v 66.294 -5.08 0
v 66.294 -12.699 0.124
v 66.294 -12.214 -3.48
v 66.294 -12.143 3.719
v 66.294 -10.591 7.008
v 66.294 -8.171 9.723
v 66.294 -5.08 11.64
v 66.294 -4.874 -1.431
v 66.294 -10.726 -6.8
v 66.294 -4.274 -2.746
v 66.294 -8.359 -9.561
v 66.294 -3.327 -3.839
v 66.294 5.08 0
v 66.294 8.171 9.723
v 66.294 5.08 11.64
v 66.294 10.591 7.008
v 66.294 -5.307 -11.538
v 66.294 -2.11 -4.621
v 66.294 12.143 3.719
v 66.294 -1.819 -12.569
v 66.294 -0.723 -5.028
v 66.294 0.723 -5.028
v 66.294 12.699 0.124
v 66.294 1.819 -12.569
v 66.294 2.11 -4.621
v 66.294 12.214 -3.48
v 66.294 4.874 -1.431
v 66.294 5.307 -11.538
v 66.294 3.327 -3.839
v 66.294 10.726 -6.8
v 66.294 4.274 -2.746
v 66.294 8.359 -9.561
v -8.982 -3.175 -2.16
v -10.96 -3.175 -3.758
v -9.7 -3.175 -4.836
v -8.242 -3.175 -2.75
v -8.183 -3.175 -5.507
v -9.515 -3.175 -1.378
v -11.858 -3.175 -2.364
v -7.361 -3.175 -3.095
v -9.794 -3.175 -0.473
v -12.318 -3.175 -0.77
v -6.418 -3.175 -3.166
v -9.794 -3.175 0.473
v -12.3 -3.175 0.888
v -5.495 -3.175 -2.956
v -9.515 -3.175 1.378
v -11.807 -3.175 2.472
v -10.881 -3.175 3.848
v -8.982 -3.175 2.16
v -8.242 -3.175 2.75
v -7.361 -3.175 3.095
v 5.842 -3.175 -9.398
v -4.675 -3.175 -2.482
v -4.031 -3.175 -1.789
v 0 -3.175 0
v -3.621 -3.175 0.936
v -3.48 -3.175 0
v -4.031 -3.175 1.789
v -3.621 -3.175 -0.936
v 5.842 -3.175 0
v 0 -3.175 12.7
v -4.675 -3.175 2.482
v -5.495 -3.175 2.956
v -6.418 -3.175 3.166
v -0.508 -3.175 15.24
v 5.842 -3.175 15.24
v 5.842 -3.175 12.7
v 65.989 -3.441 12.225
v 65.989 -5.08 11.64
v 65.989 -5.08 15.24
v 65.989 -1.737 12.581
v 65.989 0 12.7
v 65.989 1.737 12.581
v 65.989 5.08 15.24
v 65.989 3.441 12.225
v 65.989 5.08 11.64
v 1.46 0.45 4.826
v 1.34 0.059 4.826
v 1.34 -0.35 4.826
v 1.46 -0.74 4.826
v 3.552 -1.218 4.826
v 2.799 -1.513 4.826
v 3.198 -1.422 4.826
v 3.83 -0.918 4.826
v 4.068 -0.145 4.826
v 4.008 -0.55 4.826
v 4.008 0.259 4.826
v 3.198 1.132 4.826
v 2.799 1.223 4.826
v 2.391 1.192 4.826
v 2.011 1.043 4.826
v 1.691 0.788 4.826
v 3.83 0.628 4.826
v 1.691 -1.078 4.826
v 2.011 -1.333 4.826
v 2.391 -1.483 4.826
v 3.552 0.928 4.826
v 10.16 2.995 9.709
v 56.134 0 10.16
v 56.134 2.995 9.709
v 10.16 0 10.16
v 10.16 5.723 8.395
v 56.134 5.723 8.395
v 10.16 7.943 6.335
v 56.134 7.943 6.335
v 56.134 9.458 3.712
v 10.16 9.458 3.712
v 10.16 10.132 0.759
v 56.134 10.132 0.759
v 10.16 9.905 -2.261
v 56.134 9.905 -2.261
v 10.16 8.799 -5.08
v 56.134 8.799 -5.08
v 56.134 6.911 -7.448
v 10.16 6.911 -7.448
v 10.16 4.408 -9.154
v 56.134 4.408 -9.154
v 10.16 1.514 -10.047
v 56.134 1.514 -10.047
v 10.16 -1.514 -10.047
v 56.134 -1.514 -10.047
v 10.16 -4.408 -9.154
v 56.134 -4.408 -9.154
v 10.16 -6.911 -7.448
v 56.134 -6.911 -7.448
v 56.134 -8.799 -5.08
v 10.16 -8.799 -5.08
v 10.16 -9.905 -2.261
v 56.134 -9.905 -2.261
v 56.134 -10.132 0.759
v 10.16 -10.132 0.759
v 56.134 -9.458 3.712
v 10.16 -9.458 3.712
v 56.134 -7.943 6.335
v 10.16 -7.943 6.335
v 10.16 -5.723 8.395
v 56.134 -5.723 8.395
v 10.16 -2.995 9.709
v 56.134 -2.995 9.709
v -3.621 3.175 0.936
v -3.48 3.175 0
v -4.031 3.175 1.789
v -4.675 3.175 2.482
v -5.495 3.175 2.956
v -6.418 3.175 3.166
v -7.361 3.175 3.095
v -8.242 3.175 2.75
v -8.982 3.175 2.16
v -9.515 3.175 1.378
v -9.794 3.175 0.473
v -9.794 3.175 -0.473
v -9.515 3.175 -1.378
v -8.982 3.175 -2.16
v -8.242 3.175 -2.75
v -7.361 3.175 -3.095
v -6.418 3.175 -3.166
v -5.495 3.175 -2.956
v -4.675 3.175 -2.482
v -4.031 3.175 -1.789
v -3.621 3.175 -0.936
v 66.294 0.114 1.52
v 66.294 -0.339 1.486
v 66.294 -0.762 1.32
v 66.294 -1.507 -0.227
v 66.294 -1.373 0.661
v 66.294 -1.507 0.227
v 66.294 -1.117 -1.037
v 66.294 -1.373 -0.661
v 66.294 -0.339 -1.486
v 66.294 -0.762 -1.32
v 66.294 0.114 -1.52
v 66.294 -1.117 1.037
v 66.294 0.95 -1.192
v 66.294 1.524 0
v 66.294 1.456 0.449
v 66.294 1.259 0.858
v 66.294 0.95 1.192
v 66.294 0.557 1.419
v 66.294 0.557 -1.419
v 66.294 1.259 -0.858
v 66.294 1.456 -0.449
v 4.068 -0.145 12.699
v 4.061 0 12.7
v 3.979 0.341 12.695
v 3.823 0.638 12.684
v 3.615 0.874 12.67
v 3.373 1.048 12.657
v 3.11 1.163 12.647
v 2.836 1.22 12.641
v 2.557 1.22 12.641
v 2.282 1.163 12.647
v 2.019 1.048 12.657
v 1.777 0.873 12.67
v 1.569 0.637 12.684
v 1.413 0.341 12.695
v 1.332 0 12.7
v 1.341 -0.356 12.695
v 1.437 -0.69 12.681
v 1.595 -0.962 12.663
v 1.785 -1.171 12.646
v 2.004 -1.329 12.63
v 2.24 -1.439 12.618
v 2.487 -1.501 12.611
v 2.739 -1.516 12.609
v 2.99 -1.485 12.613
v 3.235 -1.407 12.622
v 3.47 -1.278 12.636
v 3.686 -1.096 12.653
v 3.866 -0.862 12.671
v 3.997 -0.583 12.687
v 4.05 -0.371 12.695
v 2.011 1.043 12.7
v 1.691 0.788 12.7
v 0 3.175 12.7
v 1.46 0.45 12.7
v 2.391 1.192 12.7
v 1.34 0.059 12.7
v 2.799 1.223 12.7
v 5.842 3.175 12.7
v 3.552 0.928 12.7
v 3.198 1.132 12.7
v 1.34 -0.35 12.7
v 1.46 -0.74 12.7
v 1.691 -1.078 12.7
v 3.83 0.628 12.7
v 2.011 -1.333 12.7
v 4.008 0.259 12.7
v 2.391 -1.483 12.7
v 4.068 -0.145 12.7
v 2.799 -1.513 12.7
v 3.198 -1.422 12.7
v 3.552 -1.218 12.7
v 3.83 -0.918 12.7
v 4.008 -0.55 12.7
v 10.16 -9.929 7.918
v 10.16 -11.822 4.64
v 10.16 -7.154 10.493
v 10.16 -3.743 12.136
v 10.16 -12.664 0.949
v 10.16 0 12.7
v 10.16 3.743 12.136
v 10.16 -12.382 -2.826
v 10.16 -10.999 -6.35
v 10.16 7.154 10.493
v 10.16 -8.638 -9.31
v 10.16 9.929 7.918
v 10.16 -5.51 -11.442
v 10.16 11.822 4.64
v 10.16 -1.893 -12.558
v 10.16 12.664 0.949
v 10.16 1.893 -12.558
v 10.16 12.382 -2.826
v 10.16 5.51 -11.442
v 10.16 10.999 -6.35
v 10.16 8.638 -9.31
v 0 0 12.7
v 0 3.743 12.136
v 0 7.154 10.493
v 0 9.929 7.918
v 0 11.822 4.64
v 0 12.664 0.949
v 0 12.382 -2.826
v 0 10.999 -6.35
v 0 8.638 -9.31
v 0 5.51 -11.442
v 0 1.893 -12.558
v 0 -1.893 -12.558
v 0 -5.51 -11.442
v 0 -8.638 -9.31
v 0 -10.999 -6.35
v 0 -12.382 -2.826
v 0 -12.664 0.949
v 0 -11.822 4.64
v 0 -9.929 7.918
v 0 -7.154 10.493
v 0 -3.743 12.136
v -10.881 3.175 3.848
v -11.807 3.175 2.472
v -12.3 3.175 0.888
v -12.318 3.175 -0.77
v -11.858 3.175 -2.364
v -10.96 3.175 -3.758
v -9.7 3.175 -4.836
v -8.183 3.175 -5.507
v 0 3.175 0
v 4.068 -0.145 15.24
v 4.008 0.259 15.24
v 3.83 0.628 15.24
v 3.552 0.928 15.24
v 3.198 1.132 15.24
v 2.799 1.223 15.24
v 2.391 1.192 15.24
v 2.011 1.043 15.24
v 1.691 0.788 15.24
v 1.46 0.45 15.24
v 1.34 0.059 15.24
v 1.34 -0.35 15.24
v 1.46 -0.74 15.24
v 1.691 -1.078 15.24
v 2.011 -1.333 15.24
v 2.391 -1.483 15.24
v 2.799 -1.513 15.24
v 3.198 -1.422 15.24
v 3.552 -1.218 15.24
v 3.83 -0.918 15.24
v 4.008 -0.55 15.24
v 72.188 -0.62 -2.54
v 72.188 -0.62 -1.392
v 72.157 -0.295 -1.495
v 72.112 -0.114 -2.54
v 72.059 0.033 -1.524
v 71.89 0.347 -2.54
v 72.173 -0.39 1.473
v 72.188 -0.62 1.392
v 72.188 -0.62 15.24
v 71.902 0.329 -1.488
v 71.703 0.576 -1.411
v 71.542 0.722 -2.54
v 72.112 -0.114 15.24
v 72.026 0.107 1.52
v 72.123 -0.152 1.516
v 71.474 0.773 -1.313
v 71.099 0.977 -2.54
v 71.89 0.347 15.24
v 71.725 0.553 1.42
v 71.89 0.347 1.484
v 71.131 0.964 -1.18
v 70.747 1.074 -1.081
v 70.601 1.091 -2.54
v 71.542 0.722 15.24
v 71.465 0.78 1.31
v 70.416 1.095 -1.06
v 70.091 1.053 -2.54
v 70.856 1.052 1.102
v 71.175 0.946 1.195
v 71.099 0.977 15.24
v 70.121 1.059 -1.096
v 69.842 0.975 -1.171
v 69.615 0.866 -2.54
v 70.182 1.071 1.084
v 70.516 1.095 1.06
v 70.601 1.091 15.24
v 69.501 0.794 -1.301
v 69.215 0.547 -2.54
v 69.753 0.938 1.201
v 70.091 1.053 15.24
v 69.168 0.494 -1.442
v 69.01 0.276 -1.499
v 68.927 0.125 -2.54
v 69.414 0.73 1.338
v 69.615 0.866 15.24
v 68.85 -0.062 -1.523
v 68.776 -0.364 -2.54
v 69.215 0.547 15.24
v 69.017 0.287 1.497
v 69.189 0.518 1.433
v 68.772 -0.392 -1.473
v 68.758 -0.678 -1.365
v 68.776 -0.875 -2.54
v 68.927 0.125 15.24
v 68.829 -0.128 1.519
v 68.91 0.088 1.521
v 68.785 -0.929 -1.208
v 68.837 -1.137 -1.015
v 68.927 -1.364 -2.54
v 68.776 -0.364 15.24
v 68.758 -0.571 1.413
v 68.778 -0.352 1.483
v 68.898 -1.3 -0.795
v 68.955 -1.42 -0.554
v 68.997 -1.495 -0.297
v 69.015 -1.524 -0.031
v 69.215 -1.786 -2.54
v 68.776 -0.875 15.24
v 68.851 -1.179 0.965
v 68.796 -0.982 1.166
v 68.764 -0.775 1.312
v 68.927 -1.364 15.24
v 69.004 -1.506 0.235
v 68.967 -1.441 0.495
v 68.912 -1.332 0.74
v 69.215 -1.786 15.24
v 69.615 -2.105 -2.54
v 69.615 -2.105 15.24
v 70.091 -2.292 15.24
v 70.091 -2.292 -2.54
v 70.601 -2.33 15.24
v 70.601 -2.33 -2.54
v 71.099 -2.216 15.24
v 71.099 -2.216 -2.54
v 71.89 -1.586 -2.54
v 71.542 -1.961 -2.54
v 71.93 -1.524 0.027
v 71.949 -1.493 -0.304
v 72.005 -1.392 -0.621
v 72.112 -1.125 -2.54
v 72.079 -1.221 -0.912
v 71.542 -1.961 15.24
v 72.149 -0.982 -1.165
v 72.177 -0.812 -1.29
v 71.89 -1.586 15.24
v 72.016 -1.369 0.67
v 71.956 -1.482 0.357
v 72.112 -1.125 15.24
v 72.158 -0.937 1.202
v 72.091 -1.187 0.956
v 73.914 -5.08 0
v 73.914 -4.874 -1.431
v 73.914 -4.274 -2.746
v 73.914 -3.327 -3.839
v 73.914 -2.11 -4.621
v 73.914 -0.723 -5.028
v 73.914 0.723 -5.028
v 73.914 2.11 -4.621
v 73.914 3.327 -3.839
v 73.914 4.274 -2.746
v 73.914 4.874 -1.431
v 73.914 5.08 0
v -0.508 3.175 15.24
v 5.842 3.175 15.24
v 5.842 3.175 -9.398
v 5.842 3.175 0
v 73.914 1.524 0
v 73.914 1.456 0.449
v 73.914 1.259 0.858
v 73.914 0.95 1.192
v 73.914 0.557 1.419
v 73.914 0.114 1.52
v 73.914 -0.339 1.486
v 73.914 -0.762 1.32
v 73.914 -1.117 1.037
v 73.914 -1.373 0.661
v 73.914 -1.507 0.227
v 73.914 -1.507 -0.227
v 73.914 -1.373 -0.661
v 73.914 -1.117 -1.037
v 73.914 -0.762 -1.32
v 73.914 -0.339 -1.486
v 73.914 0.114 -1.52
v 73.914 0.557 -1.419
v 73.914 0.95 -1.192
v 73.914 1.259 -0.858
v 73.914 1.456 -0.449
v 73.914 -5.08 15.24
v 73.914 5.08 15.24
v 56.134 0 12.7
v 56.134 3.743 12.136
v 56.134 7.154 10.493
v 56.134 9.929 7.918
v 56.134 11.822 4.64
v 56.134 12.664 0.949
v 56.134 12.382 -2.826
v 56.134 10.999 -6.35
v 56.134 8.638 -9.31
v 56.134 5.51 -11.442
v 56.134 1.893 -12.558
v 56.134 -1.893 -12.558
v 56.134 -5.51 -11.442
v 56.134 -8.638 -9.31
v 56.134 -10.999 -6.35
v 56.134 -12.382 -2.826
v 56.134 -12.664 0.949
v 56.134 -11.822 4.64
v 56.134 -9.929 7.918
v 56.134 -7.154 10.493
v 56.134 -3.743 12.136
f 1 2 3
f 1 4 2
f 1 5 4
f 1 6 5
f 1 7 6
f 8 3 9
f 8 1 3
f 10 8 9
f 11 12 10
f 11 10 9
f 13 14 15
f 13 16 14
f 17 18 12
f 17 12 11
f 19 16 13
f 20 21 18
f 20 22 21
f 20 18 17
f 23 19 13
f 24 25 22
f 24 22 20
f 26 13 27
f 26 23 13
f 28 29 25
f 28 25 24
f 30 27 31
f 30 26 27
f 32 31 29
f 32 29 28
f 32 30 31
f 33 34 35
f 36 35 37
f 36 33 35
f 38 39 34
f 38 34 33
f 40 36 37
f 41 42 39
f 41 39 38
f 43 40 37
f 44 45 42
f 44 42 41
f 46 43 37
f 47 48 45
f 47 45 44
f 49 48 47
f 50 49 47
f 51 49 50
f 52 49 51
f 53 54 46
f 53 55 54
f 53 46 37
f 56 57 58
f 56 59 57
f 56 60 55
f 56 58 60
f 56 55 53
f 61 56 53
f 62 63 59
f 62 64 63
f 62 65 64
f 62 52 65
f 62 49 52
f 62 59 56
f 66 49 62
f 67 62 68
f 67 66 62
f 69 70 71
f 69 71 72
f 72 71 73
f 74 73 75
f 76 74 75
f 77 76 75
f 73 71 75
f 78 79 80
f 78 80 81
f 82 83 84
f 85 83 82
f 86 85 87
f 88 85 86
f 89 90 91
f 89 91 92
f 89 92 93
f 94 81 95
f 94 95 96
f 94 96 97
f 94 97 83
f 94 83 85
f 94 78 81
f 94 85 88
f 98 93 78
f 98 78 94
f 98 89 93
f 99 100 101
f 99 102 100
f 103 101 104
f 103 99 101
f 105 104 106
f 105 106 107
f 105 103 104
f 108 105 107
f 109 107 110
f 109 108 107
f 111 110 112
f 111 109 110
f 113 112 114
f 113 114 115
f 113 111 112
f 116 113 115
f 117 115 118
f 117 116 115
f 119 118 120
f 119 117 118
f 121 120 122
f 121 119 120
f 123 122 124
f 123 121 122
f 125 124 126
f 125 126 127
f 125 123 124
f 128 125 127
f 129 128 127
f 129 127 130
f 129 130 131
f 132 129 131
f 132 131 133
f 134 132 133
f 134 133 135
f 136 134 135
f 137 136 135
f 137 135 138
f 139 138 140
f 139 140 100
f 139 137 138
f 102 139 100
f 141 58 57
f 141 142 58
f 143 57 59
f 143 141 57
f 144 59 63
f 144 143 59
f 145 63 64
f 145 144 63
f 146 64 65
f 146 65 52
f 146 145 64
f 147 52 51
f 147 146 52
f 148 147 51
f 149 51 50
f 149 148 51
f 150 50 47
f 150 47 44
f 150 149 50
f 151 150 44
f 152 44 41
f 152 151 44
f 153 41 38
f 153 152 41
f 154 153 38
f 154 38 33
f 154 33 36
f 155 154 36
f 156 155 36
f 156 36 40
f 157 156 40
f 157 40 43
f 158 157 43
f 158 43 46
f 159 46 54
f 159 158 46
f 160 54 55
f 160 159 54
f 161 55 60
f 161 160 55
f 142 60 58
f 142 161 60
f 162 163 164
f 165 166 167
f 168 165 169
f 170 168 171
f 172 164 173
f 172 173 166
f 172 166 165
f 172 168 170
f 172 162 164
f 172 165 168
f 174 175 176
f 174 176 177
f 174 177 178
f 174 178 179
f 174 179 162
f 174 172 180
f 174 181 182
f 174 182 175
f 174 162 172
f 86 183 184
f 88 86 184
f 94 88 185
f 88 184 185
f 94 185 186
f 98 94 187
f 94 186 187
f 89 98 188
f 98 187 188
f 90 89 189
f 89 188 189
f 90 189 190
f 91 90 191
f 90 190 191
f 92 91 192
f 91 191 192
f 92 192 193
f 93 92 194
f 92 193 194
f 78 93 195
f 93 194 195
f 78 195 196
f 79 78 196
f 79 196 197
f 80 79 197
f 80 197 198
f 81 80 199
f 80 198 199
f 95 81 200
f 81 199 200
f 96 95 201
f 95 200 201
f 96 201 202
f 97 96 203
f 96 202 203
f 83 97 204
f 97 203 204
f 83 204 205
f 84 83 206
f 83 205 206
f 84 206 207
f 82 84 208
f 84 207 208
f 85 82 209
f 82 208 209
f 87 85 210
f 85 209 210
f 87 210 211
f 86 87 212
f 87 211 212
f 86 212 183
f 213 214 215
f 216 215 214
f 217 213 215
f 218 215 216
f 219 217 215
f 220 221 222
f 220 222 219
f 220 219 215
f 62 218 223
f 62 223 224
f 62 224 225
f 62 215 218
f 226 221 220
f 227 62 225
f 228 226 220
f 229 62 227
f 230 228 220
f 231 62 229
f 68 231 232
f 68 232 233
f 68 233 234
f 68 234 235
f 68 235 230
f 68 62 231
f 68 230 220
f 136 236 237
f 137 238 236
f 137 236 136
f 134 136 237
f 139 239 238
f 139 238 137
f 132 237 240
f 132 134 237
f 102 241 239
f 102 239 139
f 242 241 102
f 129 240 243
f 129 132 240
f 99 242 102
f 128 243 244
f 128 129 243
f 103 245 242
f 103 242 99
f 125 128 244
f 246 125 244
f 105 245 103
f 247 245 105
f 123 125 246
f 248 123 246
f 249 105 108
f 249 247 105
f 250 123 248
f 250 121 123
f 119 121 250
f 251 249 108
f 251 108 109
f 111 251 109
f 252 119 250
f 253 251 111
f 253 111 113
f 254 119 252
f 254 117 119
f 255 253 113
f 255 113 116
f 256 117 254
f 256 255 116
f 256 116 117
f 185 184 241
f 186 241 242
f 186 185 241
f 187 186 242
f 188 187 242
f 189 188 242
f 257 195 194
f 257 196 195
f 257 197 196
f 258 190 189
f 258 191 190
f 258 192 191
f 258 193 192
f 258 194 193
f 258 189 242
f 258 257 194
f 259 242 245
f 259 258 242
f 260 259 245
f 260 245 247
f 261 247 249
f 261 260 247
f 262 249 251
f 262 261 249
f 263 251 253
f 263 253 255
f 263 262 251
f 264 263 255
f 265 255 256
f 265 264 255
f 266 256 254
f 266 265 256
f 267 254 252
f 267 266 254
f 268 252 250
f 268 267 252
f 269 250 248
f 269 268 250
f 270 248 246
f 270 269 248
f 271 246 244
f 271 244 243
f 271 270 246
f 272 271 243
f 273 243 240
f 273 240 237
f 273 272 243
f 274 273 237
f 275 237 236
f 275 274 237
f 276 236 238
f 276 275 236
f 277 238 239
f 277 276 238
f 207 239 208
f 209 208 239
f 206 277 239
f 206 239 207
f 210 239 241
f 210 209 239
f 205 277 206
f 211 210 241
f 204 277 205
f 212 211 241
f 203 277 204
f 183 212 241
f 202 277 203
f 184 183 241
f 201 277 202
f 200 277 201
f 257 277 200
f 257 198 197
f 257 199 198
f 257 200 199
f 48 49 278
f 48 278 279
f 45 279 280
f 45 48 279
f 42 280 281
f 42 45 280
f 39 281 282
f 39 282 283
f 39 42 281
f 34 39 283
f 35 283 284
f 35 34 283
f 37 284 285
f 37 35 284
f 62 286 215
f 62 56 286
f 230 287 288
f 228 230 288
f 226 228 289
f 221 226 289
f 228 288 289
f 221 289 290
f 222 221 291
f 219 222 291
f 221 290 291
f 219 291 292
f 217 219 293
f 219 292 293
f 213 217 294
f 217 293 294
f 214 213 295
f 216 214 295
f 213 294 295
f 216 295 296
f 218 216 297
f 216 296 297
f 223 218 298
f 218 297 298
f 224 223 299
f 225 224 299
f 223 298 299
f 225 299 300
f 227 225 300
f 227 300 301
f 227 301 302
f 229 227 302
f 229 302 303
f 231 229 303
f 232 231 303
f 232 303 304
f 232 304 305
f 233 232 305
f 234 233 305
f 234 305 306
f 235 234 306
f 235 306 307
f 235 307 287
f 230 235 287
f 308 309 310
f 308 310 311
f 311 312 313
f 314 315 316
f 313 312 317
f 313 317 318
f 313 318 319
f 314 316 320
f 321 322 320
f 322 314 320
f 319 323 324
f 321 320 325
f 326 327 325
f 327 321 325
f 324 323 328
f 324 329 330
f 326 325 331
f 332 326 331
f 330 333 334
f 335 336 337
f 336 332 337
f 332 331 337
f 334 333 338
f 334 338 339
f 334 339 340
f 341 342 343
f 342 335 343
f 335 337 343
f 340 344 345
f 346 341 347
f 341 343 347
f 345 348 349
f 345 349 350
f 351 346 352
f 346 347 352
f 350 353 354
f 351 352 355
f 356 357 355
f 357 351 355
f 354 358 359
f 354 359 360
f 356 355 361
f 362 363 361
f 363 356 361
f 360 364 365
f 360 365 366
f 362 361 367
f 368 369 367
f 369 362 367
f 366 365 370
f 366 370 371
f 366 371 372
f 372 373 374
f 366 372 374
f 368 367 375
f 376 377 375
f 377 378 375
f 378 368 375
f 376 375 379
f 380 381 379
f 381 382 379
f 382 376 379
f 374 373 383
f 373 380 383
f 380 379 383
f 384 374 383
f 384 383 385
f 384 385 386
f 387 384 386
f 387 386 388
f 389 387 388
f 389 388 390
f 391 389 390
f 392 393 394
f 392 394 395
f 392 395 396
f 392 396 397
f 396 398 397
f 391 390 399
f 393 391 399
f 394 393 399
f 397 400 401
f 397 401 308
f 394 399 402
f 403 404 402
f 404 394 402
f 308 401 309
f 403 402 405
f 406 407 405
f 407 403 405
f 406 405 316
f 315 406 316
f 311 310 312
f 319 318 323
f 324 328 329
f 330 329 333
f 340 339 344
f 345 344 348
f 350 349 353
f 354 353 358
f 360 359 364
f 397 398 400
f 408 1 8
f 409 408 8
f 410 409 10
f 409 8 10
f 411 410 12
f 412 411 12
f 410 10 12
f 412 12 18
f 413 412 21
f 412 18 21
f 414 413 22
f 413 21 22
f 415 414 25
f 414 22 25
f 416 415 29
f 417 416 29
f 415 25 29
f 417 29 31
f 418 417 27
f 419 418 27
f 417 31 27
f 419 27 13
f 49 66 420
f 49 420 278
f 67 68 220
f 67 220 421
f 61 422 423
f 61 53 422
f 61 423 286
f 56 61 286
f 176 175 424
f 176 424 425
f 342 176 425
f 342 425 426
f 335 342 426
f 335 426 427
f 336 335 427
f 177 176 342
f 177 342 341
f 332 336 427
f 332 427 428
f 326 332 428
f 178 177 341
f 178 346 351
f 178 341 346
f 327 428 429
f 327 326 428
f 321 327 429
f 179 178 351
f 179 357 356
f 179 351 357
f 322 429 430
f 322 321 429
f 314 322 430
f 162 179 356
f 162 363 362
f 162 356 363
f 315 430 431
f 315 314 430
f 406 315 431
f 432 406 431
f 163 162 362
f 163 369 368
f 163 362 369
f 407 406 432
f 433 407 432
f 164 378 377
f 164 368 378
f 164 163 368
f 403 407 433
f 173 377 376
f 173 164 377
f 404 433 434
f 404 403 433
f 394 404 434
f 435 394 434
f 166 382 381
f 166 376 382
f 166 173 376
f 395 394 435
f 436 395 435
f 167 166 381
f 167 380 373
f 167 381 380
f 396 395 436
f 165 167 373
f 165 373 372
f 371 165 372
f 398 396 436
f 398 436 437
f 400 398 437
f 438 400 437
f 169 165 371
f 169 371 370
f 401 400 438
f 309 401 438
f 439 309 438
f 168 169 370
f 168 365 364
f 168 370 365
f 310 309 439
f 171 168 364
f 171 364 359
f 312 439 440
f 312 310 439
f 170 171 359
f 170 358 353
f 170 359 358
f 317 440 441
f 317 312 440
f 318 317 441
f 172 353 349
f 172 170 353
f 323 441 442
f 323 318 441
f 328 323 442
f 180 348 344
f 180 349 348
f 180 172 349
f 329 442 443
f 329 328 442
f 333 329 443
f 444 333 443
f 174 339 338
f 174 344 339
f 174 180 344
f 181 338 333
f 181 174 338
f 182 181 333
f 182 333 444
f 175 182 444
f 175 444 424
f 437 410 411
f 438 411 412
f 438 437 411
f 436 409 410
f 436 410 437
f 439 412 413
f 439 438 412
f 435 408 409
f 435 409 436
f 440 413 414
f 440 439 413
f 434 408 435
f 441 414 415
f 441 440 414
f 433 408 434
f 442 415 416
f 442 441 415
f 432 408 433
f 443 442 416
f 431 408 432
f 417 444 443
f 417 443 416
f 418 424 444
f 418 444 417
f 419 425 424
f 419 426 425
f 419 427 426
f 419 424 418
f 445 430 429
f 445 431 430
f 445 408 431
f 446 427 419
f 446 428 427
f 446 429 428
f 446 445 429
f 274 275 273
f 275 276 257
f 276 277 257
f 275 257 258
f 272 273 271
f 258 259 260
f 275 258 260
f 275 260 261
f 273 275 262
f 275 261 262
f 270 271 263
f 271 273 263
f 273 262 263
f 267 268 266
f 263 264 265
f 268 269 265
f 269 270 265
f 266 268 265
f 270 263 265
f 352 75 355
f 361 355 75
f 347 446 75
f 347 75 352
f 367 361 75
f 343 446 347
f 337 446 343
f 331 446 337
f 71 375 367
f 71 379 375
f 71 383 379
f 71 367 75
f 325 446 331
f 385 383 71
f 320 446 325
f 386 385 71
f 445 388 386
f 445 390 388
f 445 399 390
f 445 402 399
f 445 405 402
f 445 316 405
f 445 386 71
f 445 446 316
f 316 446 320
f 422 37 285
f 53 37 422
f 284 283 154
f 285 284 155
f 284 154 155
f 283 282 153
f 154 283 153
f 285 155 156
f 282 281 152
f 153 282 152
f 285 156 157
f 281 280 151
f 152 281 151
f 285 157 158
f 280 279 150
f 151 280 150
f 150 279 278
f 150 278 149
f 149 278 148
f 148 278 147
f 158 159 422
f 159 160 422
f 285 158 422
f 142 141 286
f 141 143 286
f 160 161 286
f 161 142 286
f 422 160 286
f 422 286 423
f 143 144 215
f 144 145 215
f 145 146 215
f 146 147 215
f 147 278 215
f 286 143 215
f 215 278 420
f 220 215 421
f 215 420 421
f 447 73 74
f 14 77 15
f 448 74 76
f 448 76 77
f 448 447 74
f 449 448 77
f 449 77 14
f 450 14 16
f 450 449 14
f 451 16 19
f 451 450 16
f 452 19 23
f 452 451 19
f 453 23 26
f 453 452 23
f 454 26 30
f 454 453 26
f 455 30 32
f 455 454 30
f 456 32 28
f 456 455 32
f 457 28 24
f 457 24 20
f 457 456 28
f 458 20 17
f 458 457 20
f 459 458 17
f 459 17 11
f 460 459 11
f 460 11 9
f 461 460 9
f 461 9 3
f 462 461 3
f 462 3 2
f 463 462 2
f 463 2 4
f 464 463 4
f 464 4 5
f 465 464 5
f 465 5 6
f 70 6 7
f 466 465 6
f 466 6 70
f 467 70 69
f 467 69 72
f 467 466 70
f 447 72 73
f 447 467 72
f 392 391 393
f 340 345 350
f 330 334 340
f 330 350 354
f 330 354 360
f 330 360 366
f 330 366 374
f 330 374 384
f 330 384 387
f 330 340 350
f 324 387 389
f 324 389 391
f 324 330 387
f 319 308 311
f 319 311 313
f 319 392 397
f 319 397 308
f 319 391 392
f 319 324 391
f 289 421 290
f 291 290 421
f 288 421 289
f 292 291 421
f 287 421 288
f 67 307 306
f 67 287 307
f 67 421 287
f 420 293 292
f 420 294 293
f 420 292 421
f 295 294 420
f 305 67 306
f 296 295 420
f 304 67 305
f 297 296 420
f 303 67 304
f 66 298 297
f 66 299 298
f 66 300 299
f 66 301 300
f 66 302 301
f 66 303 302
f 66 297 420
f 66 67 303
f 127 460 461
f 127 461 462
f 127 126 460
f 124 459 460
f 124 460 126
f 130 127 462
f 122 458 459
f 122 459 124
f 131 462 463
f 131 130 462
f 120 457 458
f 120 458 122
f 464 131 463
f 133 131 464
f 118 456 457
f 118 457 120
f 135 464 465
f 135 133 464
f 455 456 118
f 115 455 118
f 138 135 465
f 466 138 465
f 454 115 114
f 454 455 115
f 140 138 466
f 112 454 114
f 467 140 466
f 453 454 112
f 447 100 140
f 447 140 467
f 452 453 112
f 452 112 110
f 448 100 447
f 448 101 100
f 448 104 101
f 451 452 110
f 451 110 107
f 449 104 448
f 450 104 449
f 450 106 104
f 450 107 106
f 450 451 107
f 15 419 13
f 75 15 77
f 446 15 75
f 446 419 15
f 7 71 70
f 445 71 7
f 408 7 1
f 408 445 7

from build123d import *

# Parameters (mm, degrees)
F0_W     = 5.842
F0_H     = 12.7
F0_R     = 3.175
F2_DEPTH = 3.175
F3_R     = 1.524
F4_DEPTH = 7.62
F5_DEPTH = 0.3048
F6_R     = 1.715399248
F7_DEPTH = 17.78
F8_R     = 1.3719725567
F9_DEPTH = 10.414


with BuildPart() as f1:
    # F0 (on Front) → F1 (revolve)
    with BuildSketch(Plane.XZ):
        Polygon((5.842, 12.7), (5.842, 0), (66.294, 0), (66.294, 12.7), (56.134, 12.7), (56.134, 10.16), (10.16, 10.16), (10.16, 12.7), align=None)
        with Locations((2.921, 6.35)):
            Rectangle(F0_W, F0_H)
    revolve(axis=Axis((33.147, 0, 0), (-1, 0, 0)))

    # F3 (on face) → F4 (join)
    with BuildSketch(Plane.YZ.offset(66.294)):
        with BuildLine():
            ThreePointArc((-5.08, 11.6397422652), (0, 12.7), (5.08, 11.6397422652))
            Line((5.08, 11.6397422652), (5.08, 15.24))
            Line((5.08, 15.24), (-5.08, 15.24))
            Line((-5.08, 15.24), (-5.08, 11.6397422652))
        make_face()
        with BuildLine():
            ThreePointArc((-5.08, 0), (0, 5.08), (5.08, 0))
            Line((5.08, 0), (5.08, 11.6397422652))
            ThreePointArc((5.08, 11.6397422652), (0, 12.7), (-5.08, 11.6397422652))
            Line((-5.08, 11.6397422652), (-5.08, 0))
        make_face()
        with BuildLine():
            ThreePointArc((-5.08, 0), (0, -5.08), (5.08, 0))
            ThreePointArc((5.08, 0), (0, 5.08), (-5.08, 0))
        make_face()
        Circle(F3_R, mode=Mode.SUBTRACT)
    extrude(amount=F4_DEPTH)

    # F3 (on face) → F5 (join)
    with BuildSketch(Plane.YZ.offset(66.294)):
        with BuildLine():
            ThreePointArc((-5.08, 0), (0, -5.08), (5.08, 0))
            ThreePointArc((5.08, 0), (0, 5.08), (-5.08, 0))
        make_face()
        Circle(F3_R, mode=Mode.SUBTRACT)
        with BuildLine():
            ThreePointArc((-5.08, 0), (0, 5.08), (5.08, 0))
            Line((5.08, 0), (5.08, 15.24))
            Line((5.08, 15.24), (-5.08, 15.24))
            Line((-5.08, 15.24), (-5.08, 0))
        make_face()
    extrude(amount=-F5_DEPTH)

    # F6 (on face) → F7 (cut)
    with BuildSketch(Plane.XY.offset(15.24)):
        with Locations((70.4726949334, -0.6196037284)):
            Circle(F6_R)
    extrude(amount=-F7_DEPTH, mode=Mode.SUBTRACT)


with BuildPart() as f2:
    # F0 (on Front) → F2 (new body, symmetric)
    with BuildSketch(Plane.XZ):
        with BuildLine():
            Line((-0.9398, 0), (0, 0))
            Line((0, 0), (0, 12.7))
            Line((0, 12.7), (5.842, 12.7))
            Line((5.842, 12.7), (5.842, 15.24))
            Line((5.842, 15.24), (-0.508, 15.24))
            Line((-0.508, 15.24), (-10.8806298187, 3.8475430269))
            ThreePointArc((-10.8806298187, 3.8475430269), (-4.5919612295, 5.3297205562), (-0.9398, 0))
        make_face()
        with BuildLine():
            ThreePointArc((-8.1826630726, -5.5069827884), (-3.1957909266, -4.5493385486), (-0.9398, 0))
            ThreePointArc((-0.9398, 0), (-4.5919612295, 5.3297205562), (-10.8806298187, 3.8475430269))
            ThreePointArc((-10.8806298187, 3.8475430269), (-12.1459778134, -1.5837270034), (-8.1826630726, -5.5069827884))
        make_face()
        with Locations((-6.6548, 0)):
            Circle(F0_R, mode=Mode.SUBTRACT)
        with BuildLine():
            Line((5.842, 0), (0, 0))
            Line((0, 0), (-0.9398, 0))
            ThreePointArc((-0.9398, 0), (-3.1957909266, -4.5493385486), (-8.1826630726, -5.5069827884))
            Line((-8.1826630726, -5.5069827884), (5.842, -9.398))
            Line((5.842, -9.398), (5.842, 0))
        make_face()
    extrude(amount=F2_DEPTH, both=True)


with BuildPart() as f9_tool:
    # F8 (on face) → F9 (new body)
    with BuildSketch(Plane.XY.offset(15.24)):
        with Locations((2.6965192519, -0.1451129647)):
            Circle(F8_R)
    extrude(amount=-F9_DEPTH)


with BuildPart() as f1_1:
    add(f1.part)

    # F9: cut by f9_tool
    add(f9_tool.part, mode=Mode.SUBTRACT)


with BuildPart() as f2_1:
    add(f2.part)

    # F9: cut by f9_tool
    add(f9_tool.part, mode=Mode.SUBTRACT)


solid = Compound([f1_1.part, f2_1.part])
